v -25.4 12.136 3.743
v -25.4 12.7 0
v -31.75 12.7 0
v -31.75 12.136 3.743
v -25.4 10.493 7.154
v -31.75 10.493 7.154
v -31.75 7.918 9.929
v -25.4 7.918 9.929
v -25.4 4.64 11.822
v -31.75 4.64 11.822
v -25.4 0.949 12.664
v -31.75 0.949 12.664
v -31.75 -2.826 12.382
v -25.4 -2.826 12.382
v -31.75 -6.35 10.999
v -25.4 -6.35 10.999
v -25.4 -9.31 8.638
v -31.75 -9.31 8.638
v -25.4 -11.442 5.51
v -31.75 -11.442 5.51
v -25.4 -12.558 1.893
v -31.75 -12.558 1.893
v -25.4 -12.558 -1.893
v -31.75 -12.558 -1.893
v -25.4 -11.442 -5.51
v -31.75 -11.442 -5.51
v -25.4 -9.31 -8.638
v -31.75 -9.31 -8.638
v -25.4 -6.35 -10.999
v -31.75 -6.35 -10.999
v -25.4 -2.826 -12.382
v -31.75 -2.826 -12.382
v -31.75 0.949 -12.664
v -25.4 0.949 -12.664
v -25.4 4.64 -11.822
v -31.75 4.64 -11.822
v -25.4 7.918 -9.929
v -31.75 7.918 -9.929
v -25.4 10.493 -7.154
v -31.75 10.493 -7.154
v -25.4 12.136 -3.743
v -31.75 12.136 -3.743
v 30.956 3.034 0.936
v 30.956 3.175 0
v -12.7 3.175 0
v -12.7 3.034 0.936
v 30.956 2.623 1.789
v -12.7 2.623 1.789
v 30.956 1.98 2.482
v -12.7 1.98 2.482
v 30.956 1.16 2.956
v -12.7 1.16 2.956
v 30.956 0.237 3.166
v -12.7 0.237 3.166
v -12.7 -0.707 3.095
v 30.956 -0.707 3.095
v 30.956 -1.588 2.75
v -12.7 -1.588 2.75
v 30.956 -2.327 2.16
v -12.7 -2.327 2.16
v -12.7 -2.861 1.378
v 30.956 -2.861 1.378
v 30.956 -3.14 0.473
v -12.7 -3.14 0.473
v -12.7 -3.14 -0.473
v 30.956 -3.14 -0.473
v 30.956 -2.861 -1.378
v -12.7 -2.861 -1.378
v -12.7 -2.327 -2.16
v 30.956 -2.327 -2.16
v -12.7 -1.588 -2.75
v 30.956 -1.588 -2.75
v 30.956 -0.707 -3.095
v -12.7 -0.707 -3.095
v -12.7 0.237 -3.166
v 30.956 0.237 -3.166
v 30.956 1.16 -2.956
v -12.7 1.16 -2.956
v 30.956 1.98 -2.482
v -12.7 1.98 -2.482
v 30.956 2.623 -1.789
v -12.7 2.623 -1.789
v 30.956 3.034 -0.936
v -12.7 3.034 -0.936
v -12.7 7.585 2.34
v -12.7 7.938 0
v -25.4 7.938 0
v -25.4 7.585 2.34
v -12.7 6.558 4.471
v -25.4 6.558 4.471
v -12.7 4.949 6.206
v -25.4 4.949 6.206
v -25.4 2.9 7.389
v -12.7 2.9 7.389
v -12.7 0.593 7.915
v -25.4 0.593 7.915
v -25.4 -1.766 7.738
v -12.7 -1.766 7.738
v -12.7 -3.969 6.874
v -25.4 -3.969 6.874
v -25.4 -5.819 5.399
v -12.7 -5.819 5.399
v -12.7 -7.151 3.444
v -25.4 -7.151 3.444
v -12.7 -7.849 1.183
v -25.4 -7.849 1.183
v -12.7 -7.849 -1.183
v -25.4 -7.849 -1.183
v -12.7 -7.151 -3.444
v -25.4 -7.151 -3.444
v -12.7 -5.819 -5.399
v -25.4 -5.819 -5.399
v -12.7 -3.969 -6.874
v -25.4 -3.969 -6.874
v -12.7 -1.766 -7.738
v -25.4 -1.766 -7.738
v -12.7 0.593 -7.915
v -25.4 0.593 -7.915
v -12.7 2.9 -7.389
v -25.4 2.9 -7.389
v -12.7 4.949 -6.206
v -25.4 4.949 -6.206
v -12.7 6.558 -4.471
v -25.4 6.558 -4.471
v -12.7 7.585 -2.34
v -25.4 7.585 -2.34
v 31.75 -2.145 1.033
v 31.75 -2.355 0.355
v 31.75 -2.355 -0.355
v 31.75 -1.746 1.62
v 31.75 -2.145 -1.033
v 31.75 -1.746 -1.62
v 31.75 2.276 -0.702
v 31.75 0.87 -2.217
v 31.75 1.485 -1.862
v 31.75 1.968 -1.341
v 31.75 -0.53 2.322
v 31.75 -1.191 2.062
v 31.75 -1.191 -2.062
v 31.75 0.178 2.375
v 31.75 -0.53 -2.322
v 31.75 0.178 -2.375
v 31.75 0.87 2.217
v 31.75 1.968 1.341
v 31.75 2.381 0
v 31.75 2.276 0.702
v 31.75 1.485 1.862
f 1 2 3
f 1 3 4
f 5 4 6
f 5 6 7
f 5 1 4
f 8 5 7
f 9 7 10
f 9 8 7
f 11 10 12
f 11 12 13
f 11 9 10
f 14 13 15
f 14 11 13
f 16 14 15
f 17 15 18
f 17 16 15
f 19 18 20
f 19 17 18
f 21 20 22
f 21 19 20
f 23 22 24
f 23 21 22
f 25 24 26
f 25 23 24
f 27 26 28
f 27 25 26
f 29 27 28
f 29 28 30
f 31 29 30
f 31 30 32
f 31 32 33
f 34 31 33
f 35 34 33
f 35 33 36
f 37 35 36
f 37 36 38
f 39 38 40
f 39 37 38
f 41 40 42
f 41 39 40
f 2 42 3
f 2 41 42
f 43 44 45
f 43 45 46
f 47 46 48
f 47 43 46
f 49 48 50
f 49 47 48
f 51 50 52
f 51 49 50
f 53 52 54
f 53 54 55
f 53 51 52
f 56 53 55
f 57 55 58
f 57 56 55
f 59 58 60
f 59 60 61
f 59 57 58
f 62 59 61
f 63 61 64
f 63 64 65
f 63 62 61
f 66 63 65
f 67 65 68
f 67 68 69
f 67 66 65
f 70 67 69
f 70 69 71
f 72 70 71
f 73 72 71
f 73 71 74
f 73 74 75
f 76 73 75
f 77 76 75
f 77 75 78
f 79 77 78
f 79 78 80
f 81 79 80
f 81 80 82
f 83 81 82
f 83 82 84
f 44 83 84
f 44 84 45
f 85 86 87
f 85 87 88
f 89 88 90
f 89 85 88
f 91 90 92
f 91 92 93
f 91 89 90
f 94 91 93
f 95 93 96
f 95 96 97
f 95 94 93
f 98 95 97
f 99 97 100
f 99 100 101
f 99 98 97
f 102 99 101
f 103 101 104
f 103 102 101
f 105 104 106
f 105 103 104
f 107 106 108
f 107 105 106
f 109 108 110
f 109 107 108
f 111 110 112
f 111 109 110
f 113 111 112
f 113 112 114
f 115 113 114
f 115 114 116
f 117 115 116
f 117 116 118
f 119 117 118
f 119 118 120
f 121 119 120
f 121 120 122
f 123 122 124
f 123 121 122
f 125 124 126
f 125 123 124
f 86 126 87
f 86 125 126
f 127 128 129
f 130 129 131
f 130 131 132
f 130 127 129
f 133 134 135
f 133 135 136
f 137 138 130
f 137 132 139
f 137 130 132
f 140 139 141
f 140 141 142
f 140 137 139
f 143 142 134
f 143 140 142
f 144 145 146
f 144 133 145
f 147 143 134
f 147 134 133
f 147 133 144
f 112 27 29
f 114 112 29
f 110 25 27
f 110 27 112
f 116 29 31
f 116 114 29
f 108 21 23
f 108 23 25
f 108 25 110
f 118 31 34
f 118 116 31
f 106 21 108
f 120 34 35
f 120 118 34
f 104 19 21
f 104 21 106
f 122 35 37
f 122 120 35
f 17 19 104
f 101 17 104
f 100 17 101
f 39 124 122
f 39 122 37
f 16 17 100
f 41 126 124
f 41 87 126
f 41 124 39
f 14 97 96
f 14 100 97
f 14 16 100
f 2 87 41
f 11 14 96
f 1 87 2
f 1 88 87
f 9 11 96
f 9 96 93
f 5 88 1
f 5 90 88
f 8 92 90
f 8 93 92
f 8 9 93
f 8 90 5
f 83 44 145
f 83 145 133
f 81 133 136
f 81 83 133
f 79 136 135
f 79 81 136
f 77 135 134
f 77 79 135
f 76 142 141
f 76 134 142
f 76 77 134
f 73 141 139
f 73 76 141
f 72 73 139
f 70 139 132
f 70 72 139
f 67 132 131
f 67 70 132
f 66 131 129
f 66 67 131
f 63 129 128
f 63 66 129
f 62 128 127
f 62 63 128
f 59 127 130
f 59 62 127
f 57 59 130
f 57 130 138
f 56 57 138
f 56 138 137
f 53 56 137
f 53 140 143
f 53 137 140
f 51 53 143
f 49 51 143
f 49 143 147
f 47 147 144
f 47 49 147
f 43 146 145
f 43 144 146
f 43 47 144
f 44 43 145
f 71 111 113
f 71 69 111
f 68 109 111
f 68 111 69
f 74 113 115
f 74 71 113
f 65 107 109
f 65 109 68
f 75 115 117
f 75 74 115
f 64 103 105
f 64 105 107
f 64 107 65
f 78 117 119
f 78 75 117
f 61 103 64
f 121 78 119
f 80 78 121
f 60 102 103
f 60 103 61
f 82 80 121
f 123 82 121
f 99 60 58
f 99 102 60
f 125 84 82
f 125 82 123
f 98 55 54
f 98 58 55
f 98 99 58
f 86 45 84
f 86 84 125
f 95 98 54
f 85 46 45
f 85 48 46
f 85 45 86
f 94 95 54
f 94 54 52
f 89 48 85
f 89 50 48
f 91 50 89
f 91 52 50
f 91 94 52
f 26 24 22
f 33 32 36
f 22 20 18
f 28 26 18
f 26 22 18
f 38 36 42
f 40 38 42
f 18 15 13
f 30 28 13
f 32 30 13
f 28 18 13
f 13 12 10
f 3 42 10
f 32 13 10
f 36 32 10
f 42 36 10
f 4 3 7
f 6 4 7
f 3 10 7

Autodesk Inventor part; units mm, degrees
ref_plane "YZ Plane" through (0, 0, 0) normal (1, 0, 0) x (0, 1, 0)
ref_plane "XZ Plane" through (0, 0, 0) normal (0, 1, 0) x (-1, 0, 0)
ref_plane "XY Plane" through (0, 0, 0) normal (0, 0, 1) x (1, 0, 0)
sketch "Sketch1" plane through (0, 0, 0) normal (0, 0, 1) x (1, 0, 0)
  line L0 (-31.75, 0) -> (31.75, 0)
  line L1 (-31.75, 0) -> (-31.75, 12.7)
  line L2 (-31.75, 12.7) -> (-25.4, 12.7)
  line L3 (-25.4, 12.7) -> (-25.4, 7.9375)
  line L4 (-25.4, 7.9375) -> (-12.7, 7.9375)
  line L5 (-12.7, 7.9375) -> (-12.7, 3.175)
  line L6 (-12.7, 3.175) -> (31.75, 3.175)
  line L7 (31.75, 3.175) -> (31.75, 0)
  point P0 (0, 0)
  point P1 (0, 0)
  dimension "d0" = 25.4
  dimension "d1" = 15.875
  dimension "d2" = 6.35
  dimension "d3" = 6.35
  dimension "d4" = 12.7
  dimension "d5" = 44.45
revolve "Revolution1" add sketch "Sketch1" angle 360 about axis through (-31.75, 0, 0) along (1, 0, 0)
chamfer "Chamfer1" distance 0.7937 angle 45 1 edges at (31.75, -3.175, 0)
properties part number "FE-120-008 Pin" material "Aluminum 6061"
